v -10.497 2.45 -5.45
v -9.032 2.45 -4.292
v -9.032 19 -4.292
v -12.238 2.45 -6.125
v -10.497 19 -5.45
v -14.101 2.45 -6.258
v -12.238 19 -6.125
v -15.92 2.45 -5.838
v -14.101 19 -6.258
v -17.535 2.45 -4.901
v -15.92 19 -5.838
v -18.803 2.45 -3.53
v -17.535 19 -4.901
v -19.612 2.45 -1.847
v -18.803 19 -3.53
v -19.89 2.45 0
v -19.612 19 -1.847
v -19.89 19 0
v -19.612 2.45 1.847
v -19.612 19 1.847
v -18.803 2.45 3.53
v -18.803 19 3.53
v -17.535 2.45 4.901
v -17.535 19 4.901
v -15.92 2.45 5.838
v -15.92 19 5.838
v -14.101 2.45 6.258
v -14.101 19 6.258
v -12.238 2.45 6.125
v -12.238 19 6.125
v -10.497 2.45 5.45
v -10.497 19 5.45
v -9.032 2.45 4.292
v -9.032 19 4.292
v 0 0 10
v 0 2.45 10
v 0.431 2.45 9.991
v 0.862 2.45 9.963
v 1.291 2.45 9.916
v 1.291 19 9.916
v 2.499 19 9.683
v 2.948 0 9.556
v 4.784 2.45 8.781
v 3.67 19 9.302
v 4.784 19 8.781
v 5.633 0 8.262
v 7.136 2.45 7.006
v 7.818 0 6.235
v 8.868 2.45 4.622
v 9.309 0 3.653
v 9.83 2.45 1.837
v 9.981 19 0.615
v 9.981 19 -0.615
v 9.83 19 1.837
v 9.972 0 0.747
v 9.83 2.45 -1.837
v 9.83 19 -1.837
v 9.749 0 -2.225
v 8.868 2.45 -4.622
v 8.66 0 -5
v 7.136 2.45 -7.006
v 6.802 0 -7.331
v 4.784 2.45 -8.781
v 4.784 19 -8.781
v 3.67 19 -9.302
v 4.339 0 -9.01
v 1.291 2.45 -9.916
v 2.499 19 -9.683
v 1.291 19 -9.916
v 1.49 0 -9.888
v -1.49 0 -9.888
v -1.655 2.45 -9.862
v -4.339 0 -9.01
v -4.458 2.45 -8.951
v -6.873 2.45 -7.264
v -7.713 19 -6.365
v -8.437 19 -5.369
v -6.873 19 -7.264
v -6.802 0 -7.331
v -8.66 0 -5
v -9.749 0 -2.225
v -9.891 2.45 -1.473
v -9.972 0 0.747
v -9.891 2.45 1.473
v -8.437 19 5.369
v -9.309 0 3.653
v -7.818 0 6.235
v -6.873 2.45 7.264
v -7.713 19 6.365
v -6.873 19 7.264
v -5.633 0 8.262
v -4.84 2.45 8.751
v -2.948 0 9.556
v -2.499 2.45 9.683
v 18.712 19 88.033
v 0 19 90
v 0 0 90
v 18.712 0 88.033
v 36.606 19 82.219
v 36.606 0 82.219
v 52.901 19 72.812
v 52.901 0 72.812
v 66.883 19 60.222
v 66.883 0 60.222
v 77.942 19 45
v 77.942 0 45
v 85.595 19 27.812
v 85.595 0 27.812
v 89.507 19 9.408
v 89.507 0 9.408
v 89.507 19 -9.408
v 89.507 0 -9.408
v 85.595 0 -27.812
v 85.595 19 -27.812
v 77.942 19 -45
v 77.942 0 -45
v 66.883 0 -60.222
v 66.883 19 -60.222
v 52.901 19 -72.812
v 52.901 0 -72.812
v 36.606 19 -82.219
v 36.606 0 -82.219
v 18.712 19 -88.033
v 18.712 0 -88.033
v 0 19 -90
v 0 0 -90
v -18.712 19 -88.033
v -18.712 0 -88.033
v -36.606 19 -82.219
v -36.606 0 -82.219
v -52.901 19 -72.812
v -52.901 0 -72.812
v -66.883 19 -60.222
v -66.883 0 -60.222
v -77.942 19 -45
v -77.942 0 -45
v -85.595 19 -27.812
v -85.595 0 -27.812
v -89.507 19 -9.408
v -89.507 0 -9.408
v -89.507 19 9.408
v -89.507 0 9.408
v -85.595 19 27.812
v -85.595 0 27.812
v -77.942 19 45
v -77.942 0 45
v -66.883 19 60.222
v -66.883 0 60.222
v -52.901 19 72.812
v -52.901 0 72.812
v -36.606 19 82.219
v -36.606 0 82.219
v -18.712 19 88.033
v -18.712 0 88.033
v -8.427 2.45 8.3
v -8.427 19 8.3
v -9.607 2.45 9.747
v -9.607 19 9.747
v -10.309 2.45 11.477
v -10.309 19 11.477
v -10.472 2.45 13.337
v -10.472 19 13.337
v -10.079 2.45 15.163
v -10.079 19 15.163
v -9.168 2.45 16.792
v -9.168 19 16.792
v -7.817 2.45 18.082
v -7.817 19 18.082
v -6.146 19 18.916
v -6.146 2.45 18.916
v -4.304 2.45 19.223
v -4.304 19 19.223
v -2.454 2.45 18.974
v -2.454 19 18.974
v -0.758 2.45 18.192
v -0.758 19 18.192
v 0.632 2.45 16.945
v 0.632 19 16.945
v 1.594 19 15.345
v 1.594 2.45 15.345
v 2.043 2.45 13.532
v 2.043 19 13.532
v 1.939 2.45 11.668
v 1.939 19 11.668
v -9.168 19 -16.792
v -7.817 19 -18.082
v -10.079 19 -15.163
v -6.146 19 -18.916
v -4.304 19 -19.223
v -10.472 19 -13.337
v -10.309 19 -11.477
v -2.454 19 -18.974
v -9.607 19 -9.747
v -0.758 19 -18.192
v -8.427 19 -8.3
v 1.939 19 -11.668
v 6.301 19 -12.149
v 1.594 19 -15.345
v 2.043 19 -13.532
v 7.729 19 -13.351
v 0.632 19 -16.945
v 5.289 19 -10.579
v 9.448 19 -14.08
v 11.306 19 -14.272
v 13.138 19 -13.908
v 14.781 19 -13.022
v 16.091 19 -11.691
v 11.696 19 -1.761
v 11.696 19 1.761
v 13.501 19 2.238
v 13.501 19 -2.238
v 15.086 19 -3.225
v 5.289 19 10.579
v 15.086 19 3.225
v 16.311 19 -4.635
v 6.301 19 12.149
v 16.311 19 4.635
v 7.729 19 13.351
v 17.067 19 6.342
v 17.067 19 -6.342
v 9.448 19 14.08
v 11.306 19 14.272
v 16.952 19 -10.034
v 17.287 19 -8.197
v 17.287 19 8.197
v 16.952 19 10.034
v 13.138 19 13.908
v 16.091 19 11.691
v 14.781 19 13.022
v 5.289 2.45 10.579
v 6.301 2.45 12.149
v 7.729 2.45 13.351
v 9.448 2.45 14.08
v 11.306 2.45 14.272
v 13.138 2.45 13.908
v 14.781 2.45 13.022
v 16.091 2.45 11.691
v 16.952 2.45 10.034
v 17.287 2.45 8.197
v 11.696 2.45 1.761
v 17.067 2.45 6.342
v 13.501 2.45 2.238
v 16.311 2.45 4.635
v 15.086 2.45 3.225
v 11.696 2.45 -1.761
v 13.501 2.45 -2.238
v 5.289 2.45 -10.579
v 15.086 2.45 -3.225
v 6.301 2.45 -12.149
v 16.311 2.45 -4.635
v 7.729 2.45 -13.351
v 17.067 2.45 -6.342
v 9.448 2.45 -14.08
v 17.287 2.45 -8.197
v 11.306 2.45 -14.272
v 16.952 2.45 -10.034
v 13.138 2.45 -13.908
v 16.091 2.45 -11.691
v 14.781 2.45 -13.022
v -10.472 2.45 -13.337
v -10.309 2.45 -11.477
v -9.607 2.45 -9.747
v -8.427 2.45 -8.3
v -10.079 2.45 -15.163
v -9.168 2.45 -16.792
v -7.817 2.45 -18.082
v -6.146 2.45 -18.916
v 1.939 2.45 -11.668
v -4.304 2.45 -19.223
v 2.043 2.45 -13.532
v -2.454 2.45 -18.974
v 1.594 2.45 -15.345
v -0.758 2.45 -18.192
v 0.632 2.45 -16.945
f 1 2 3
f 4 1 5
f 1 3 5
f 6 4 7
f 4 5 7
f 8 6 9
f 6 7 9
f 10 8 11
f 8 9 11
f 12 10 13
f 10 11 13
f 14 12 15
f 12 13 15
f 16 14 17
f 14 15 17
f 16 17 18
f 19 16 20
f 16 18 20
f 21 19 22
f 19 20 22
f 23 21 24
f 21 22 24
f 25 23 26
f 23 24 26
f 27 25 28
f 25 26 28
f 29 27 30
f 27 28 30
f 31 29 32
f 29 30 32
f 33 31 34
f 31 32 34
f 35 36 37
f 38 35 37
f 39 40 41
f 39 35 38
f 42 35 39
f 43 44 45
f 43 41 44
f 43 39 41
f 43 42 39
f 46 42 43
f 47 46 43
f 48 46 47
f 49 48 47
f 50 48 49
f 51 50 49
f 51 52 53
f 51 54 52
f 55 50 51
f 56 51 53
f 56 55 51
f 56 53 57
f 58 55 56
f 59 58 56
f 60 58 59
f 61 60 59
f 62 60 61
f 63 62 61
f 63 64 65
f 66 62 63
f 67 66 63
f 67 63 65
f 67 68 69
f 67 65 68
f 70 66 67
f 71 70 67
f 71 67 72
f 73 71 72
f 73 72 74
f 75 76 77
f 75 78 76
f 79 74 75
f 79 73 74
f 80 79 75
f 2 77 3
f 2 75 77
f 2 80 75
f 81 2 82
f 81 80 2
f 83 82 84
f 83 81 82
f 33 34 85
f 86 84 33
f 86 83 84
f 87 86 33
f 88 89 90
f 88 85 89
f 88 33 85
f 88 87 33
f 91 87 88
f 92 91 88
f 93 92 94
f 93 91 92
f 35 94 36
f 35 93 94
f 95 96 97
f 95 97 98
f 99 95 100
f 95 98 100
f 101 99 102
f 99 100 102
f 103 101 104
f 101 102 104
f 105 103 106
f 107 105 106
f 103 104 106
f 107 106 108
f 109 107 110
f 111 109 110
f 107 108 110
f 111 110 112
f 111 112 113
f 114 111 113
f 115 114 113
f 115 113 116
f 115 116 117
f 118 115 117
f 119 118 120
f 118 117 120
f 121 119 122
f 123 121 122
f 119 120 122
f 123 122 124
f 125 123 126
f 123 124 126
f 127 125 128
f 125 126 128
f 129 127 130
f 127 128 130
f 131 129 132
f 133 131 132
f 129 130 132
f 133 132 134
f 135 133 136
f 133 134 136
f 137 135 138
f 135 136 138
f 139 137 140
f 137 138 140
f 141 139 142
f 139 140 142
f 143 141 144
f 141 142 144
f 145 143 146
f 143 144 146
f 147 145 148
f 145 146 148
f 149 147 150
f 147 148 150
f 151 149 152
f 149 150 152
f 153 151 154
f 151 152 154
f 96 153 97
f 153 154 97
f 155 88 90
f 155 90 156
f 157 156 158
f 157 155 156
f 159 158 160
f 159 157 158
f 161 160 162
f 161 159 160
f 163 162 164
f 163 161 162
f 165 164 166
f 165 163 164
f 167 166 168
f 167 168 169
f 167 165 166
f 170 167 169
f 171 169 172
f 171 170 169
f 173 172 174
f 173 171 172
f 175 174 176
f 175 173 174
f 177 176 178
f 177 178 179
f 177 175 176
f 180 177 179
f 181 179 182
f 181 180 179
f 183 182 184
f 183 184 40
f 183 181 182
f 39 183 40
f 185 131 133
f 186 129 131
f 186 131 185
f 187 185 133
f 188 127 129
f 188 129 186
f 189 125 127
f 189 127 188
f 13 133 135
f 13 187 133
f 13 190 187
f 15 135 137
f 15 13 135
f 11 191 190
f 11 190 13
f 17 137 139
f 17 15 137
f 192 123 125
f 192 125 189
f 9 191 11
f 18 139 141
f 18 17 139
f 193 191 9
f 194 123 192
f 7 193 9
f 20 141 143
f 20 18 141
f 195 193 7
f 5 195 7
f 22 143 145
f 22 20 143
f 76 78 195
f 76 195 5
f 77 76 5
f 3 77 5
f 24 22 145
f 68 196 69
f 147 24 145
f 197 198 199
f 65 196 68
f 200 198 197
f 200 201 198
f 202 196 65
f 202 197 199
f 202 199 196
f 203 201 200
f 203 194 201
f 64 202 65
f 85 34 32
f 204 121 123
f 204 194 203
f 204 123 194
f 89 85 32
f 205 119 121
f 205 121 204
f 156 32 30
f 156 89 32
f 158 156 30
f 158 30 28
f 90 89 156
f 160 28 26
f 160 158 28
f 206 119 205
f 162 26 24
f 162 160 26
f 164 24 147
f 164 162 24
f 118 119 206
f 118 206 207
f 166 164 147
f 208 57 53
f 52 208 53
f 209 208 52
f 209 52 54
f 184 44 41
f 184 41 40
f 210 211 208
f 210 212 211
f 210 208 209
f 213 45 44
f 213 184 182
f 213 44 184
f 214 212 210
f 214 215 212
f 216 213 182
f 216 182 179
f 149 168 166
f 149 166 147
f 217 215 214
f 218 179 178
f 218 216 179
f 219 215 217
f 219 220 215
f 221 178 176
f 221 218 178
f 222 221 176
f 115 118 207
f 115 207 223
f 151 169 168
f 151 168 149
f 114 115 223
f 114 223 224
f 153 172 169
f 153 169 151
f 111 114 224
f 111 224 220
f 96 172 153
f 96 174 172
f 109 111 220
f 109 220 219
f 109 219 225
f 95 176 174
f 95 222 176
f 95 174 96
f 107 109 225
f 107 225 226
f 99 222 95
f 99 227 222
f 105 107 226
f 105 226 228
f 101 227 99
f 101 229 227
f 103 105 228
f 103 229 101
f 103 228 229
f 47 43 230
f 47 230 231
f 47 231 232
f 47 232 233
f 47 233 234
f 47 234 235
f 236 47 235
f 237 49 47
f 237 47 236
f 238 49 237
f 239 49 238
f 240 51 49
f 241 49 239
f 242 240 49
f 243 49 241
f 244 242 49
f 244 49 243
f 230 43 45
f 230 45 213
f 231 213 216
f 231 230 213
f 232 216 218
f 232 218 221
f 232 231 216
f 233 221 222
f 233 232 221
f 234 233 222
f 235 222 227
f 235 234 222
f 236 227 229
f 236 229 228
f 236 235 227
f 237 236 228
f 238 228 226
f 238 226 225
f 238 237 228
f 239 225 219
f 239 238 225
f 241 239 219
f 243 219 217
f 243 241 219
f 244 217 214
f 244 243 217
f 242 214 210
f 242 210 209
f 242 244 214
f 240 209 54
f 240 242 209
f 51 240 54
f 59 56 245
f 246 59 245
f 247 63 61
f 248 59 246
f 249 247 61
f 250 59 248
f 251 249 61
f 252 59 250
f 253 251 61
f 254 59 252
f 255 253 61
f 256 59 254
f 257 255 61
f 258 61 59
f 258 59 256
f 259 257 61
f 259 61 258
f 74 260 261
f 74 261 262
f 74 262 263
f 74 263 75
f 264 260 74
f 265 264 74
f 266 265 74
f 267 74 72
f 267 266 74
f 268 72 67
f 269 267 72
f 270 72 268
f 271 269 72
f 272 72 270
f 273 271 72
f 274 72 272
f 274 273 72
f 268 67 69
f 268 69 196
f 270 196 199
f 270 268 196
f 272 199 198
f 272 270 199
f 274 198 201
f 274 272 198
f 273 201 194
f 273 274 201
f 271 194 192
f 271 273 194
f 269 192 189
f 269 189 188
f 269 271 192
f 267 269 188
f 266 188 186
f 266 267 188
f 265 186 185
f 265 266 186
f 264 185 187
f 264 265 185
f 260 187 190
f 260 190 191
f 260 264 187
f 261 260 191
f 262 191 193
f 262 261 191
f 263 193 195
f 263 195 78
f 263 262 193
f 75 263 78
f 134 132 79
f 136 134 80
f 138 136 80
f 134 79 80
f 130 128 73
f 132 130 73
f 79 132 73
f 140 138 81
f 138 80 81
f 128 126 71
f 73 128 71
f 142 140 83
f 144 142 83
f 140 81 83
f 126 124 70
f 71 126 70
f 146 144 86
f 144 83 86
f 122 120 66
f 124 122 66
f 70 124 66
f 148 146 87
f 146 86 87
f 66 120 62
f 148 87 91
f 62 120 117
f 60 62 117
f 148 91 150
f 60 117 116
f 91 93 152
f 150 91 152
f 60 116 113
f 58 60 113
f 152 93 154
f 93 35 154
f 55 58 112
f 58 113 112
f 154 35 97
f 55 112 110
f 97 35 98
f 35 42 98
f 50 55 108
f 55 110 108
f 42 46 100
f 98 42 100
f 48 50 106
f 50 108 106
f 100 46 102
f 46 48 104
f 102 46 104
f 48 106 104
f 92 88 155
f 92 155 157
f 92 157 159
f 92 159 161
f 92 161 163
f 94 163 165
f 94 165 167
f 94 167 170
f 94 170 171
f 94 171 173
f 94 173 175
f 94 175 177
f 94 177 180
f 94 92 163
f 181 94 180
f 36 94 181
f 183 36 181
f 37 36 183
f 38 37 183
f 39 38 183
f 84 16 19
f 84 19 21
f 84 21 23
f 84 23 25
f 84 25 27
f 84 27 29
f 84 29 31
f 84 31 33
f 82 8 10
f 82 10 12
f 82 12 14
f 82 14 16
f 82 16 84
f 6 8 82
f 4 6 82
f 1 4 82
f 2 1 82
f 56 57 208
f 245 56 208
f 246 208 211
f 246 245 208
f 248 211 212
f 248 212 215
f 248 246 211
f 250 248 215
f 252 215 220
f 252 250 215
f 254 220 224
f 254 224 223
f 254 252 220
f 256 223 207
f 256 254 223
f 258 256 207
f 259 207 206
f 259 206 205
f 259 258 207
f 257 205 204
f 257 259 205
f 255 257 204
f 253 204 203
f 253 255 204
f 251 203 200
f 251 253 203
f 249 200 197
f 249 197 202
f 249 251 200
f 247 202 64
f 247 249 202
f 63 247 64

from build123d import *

# Parameters (mm, degrees)
SKETCH1_R           = 90
BOSS_EXTRUDE1_DEPTH = 19
SKETCH2_R           = 10
CUT_EXTRUDE1_DEPTH  = 129.689548915
SKETCH3_R           = 6.277196243
CUT_EXTRUDE2_DEPTH  = 16.549654973
CIRPATTERN1_COUNT   = 5


with BuildPart() as part:
    # Sketch1 → Boss-Extrude1 (new body)
    with BuildSketch(Plane(origin=(0, 0, 0), x_dir=(1, 0, 0), z_dir=(0, 1, 0))):
        Circle(SKETCH1_R)
    extrude(amount=BOSS_EXTRUDE1_DEPTH)

    # Sketch2 → Cut-Extrude1 (cut, through all)
    with BuildSketch(Plane(origin=(0, 0, 0), x_dir=(1, 0, 0), z_dir=(0, 1, 0))):
        Circle(SKETCH2_R)
    extrude(amount=CUT_EXTRUDE1_DEPTH, mode=Mode.SUBTRACT)

    # Sketch3 → Cut-Extrude2 (cut)
    with BuildSketch(Plane(origin=(0, 19, 0), x_dir=(1, 0, 0), z_dir=(0, 1, 0))):
        with Locations((-13.61267623, 0)):
            Circle(SKETCH3_R)
    cut_extrude2 = extrude(amount=-CUT_EXTRUDE2_DEPTH, mode=Mode.SUBTRACT)

    # CirPattern1: Cut-Extrude2 ×5 about axis
    cirpattern1_axis = Axis((0, 0, 0), (0, 1, 0))
    for i in range(1, CIRPATTERN1_COUNT):
        add(cut_extrude2.rotate(cirpattern1_axis, i * 360 / CIRPATTERN1_COUNT), mode=Mode.SUBTRACT)


solid = part.part
